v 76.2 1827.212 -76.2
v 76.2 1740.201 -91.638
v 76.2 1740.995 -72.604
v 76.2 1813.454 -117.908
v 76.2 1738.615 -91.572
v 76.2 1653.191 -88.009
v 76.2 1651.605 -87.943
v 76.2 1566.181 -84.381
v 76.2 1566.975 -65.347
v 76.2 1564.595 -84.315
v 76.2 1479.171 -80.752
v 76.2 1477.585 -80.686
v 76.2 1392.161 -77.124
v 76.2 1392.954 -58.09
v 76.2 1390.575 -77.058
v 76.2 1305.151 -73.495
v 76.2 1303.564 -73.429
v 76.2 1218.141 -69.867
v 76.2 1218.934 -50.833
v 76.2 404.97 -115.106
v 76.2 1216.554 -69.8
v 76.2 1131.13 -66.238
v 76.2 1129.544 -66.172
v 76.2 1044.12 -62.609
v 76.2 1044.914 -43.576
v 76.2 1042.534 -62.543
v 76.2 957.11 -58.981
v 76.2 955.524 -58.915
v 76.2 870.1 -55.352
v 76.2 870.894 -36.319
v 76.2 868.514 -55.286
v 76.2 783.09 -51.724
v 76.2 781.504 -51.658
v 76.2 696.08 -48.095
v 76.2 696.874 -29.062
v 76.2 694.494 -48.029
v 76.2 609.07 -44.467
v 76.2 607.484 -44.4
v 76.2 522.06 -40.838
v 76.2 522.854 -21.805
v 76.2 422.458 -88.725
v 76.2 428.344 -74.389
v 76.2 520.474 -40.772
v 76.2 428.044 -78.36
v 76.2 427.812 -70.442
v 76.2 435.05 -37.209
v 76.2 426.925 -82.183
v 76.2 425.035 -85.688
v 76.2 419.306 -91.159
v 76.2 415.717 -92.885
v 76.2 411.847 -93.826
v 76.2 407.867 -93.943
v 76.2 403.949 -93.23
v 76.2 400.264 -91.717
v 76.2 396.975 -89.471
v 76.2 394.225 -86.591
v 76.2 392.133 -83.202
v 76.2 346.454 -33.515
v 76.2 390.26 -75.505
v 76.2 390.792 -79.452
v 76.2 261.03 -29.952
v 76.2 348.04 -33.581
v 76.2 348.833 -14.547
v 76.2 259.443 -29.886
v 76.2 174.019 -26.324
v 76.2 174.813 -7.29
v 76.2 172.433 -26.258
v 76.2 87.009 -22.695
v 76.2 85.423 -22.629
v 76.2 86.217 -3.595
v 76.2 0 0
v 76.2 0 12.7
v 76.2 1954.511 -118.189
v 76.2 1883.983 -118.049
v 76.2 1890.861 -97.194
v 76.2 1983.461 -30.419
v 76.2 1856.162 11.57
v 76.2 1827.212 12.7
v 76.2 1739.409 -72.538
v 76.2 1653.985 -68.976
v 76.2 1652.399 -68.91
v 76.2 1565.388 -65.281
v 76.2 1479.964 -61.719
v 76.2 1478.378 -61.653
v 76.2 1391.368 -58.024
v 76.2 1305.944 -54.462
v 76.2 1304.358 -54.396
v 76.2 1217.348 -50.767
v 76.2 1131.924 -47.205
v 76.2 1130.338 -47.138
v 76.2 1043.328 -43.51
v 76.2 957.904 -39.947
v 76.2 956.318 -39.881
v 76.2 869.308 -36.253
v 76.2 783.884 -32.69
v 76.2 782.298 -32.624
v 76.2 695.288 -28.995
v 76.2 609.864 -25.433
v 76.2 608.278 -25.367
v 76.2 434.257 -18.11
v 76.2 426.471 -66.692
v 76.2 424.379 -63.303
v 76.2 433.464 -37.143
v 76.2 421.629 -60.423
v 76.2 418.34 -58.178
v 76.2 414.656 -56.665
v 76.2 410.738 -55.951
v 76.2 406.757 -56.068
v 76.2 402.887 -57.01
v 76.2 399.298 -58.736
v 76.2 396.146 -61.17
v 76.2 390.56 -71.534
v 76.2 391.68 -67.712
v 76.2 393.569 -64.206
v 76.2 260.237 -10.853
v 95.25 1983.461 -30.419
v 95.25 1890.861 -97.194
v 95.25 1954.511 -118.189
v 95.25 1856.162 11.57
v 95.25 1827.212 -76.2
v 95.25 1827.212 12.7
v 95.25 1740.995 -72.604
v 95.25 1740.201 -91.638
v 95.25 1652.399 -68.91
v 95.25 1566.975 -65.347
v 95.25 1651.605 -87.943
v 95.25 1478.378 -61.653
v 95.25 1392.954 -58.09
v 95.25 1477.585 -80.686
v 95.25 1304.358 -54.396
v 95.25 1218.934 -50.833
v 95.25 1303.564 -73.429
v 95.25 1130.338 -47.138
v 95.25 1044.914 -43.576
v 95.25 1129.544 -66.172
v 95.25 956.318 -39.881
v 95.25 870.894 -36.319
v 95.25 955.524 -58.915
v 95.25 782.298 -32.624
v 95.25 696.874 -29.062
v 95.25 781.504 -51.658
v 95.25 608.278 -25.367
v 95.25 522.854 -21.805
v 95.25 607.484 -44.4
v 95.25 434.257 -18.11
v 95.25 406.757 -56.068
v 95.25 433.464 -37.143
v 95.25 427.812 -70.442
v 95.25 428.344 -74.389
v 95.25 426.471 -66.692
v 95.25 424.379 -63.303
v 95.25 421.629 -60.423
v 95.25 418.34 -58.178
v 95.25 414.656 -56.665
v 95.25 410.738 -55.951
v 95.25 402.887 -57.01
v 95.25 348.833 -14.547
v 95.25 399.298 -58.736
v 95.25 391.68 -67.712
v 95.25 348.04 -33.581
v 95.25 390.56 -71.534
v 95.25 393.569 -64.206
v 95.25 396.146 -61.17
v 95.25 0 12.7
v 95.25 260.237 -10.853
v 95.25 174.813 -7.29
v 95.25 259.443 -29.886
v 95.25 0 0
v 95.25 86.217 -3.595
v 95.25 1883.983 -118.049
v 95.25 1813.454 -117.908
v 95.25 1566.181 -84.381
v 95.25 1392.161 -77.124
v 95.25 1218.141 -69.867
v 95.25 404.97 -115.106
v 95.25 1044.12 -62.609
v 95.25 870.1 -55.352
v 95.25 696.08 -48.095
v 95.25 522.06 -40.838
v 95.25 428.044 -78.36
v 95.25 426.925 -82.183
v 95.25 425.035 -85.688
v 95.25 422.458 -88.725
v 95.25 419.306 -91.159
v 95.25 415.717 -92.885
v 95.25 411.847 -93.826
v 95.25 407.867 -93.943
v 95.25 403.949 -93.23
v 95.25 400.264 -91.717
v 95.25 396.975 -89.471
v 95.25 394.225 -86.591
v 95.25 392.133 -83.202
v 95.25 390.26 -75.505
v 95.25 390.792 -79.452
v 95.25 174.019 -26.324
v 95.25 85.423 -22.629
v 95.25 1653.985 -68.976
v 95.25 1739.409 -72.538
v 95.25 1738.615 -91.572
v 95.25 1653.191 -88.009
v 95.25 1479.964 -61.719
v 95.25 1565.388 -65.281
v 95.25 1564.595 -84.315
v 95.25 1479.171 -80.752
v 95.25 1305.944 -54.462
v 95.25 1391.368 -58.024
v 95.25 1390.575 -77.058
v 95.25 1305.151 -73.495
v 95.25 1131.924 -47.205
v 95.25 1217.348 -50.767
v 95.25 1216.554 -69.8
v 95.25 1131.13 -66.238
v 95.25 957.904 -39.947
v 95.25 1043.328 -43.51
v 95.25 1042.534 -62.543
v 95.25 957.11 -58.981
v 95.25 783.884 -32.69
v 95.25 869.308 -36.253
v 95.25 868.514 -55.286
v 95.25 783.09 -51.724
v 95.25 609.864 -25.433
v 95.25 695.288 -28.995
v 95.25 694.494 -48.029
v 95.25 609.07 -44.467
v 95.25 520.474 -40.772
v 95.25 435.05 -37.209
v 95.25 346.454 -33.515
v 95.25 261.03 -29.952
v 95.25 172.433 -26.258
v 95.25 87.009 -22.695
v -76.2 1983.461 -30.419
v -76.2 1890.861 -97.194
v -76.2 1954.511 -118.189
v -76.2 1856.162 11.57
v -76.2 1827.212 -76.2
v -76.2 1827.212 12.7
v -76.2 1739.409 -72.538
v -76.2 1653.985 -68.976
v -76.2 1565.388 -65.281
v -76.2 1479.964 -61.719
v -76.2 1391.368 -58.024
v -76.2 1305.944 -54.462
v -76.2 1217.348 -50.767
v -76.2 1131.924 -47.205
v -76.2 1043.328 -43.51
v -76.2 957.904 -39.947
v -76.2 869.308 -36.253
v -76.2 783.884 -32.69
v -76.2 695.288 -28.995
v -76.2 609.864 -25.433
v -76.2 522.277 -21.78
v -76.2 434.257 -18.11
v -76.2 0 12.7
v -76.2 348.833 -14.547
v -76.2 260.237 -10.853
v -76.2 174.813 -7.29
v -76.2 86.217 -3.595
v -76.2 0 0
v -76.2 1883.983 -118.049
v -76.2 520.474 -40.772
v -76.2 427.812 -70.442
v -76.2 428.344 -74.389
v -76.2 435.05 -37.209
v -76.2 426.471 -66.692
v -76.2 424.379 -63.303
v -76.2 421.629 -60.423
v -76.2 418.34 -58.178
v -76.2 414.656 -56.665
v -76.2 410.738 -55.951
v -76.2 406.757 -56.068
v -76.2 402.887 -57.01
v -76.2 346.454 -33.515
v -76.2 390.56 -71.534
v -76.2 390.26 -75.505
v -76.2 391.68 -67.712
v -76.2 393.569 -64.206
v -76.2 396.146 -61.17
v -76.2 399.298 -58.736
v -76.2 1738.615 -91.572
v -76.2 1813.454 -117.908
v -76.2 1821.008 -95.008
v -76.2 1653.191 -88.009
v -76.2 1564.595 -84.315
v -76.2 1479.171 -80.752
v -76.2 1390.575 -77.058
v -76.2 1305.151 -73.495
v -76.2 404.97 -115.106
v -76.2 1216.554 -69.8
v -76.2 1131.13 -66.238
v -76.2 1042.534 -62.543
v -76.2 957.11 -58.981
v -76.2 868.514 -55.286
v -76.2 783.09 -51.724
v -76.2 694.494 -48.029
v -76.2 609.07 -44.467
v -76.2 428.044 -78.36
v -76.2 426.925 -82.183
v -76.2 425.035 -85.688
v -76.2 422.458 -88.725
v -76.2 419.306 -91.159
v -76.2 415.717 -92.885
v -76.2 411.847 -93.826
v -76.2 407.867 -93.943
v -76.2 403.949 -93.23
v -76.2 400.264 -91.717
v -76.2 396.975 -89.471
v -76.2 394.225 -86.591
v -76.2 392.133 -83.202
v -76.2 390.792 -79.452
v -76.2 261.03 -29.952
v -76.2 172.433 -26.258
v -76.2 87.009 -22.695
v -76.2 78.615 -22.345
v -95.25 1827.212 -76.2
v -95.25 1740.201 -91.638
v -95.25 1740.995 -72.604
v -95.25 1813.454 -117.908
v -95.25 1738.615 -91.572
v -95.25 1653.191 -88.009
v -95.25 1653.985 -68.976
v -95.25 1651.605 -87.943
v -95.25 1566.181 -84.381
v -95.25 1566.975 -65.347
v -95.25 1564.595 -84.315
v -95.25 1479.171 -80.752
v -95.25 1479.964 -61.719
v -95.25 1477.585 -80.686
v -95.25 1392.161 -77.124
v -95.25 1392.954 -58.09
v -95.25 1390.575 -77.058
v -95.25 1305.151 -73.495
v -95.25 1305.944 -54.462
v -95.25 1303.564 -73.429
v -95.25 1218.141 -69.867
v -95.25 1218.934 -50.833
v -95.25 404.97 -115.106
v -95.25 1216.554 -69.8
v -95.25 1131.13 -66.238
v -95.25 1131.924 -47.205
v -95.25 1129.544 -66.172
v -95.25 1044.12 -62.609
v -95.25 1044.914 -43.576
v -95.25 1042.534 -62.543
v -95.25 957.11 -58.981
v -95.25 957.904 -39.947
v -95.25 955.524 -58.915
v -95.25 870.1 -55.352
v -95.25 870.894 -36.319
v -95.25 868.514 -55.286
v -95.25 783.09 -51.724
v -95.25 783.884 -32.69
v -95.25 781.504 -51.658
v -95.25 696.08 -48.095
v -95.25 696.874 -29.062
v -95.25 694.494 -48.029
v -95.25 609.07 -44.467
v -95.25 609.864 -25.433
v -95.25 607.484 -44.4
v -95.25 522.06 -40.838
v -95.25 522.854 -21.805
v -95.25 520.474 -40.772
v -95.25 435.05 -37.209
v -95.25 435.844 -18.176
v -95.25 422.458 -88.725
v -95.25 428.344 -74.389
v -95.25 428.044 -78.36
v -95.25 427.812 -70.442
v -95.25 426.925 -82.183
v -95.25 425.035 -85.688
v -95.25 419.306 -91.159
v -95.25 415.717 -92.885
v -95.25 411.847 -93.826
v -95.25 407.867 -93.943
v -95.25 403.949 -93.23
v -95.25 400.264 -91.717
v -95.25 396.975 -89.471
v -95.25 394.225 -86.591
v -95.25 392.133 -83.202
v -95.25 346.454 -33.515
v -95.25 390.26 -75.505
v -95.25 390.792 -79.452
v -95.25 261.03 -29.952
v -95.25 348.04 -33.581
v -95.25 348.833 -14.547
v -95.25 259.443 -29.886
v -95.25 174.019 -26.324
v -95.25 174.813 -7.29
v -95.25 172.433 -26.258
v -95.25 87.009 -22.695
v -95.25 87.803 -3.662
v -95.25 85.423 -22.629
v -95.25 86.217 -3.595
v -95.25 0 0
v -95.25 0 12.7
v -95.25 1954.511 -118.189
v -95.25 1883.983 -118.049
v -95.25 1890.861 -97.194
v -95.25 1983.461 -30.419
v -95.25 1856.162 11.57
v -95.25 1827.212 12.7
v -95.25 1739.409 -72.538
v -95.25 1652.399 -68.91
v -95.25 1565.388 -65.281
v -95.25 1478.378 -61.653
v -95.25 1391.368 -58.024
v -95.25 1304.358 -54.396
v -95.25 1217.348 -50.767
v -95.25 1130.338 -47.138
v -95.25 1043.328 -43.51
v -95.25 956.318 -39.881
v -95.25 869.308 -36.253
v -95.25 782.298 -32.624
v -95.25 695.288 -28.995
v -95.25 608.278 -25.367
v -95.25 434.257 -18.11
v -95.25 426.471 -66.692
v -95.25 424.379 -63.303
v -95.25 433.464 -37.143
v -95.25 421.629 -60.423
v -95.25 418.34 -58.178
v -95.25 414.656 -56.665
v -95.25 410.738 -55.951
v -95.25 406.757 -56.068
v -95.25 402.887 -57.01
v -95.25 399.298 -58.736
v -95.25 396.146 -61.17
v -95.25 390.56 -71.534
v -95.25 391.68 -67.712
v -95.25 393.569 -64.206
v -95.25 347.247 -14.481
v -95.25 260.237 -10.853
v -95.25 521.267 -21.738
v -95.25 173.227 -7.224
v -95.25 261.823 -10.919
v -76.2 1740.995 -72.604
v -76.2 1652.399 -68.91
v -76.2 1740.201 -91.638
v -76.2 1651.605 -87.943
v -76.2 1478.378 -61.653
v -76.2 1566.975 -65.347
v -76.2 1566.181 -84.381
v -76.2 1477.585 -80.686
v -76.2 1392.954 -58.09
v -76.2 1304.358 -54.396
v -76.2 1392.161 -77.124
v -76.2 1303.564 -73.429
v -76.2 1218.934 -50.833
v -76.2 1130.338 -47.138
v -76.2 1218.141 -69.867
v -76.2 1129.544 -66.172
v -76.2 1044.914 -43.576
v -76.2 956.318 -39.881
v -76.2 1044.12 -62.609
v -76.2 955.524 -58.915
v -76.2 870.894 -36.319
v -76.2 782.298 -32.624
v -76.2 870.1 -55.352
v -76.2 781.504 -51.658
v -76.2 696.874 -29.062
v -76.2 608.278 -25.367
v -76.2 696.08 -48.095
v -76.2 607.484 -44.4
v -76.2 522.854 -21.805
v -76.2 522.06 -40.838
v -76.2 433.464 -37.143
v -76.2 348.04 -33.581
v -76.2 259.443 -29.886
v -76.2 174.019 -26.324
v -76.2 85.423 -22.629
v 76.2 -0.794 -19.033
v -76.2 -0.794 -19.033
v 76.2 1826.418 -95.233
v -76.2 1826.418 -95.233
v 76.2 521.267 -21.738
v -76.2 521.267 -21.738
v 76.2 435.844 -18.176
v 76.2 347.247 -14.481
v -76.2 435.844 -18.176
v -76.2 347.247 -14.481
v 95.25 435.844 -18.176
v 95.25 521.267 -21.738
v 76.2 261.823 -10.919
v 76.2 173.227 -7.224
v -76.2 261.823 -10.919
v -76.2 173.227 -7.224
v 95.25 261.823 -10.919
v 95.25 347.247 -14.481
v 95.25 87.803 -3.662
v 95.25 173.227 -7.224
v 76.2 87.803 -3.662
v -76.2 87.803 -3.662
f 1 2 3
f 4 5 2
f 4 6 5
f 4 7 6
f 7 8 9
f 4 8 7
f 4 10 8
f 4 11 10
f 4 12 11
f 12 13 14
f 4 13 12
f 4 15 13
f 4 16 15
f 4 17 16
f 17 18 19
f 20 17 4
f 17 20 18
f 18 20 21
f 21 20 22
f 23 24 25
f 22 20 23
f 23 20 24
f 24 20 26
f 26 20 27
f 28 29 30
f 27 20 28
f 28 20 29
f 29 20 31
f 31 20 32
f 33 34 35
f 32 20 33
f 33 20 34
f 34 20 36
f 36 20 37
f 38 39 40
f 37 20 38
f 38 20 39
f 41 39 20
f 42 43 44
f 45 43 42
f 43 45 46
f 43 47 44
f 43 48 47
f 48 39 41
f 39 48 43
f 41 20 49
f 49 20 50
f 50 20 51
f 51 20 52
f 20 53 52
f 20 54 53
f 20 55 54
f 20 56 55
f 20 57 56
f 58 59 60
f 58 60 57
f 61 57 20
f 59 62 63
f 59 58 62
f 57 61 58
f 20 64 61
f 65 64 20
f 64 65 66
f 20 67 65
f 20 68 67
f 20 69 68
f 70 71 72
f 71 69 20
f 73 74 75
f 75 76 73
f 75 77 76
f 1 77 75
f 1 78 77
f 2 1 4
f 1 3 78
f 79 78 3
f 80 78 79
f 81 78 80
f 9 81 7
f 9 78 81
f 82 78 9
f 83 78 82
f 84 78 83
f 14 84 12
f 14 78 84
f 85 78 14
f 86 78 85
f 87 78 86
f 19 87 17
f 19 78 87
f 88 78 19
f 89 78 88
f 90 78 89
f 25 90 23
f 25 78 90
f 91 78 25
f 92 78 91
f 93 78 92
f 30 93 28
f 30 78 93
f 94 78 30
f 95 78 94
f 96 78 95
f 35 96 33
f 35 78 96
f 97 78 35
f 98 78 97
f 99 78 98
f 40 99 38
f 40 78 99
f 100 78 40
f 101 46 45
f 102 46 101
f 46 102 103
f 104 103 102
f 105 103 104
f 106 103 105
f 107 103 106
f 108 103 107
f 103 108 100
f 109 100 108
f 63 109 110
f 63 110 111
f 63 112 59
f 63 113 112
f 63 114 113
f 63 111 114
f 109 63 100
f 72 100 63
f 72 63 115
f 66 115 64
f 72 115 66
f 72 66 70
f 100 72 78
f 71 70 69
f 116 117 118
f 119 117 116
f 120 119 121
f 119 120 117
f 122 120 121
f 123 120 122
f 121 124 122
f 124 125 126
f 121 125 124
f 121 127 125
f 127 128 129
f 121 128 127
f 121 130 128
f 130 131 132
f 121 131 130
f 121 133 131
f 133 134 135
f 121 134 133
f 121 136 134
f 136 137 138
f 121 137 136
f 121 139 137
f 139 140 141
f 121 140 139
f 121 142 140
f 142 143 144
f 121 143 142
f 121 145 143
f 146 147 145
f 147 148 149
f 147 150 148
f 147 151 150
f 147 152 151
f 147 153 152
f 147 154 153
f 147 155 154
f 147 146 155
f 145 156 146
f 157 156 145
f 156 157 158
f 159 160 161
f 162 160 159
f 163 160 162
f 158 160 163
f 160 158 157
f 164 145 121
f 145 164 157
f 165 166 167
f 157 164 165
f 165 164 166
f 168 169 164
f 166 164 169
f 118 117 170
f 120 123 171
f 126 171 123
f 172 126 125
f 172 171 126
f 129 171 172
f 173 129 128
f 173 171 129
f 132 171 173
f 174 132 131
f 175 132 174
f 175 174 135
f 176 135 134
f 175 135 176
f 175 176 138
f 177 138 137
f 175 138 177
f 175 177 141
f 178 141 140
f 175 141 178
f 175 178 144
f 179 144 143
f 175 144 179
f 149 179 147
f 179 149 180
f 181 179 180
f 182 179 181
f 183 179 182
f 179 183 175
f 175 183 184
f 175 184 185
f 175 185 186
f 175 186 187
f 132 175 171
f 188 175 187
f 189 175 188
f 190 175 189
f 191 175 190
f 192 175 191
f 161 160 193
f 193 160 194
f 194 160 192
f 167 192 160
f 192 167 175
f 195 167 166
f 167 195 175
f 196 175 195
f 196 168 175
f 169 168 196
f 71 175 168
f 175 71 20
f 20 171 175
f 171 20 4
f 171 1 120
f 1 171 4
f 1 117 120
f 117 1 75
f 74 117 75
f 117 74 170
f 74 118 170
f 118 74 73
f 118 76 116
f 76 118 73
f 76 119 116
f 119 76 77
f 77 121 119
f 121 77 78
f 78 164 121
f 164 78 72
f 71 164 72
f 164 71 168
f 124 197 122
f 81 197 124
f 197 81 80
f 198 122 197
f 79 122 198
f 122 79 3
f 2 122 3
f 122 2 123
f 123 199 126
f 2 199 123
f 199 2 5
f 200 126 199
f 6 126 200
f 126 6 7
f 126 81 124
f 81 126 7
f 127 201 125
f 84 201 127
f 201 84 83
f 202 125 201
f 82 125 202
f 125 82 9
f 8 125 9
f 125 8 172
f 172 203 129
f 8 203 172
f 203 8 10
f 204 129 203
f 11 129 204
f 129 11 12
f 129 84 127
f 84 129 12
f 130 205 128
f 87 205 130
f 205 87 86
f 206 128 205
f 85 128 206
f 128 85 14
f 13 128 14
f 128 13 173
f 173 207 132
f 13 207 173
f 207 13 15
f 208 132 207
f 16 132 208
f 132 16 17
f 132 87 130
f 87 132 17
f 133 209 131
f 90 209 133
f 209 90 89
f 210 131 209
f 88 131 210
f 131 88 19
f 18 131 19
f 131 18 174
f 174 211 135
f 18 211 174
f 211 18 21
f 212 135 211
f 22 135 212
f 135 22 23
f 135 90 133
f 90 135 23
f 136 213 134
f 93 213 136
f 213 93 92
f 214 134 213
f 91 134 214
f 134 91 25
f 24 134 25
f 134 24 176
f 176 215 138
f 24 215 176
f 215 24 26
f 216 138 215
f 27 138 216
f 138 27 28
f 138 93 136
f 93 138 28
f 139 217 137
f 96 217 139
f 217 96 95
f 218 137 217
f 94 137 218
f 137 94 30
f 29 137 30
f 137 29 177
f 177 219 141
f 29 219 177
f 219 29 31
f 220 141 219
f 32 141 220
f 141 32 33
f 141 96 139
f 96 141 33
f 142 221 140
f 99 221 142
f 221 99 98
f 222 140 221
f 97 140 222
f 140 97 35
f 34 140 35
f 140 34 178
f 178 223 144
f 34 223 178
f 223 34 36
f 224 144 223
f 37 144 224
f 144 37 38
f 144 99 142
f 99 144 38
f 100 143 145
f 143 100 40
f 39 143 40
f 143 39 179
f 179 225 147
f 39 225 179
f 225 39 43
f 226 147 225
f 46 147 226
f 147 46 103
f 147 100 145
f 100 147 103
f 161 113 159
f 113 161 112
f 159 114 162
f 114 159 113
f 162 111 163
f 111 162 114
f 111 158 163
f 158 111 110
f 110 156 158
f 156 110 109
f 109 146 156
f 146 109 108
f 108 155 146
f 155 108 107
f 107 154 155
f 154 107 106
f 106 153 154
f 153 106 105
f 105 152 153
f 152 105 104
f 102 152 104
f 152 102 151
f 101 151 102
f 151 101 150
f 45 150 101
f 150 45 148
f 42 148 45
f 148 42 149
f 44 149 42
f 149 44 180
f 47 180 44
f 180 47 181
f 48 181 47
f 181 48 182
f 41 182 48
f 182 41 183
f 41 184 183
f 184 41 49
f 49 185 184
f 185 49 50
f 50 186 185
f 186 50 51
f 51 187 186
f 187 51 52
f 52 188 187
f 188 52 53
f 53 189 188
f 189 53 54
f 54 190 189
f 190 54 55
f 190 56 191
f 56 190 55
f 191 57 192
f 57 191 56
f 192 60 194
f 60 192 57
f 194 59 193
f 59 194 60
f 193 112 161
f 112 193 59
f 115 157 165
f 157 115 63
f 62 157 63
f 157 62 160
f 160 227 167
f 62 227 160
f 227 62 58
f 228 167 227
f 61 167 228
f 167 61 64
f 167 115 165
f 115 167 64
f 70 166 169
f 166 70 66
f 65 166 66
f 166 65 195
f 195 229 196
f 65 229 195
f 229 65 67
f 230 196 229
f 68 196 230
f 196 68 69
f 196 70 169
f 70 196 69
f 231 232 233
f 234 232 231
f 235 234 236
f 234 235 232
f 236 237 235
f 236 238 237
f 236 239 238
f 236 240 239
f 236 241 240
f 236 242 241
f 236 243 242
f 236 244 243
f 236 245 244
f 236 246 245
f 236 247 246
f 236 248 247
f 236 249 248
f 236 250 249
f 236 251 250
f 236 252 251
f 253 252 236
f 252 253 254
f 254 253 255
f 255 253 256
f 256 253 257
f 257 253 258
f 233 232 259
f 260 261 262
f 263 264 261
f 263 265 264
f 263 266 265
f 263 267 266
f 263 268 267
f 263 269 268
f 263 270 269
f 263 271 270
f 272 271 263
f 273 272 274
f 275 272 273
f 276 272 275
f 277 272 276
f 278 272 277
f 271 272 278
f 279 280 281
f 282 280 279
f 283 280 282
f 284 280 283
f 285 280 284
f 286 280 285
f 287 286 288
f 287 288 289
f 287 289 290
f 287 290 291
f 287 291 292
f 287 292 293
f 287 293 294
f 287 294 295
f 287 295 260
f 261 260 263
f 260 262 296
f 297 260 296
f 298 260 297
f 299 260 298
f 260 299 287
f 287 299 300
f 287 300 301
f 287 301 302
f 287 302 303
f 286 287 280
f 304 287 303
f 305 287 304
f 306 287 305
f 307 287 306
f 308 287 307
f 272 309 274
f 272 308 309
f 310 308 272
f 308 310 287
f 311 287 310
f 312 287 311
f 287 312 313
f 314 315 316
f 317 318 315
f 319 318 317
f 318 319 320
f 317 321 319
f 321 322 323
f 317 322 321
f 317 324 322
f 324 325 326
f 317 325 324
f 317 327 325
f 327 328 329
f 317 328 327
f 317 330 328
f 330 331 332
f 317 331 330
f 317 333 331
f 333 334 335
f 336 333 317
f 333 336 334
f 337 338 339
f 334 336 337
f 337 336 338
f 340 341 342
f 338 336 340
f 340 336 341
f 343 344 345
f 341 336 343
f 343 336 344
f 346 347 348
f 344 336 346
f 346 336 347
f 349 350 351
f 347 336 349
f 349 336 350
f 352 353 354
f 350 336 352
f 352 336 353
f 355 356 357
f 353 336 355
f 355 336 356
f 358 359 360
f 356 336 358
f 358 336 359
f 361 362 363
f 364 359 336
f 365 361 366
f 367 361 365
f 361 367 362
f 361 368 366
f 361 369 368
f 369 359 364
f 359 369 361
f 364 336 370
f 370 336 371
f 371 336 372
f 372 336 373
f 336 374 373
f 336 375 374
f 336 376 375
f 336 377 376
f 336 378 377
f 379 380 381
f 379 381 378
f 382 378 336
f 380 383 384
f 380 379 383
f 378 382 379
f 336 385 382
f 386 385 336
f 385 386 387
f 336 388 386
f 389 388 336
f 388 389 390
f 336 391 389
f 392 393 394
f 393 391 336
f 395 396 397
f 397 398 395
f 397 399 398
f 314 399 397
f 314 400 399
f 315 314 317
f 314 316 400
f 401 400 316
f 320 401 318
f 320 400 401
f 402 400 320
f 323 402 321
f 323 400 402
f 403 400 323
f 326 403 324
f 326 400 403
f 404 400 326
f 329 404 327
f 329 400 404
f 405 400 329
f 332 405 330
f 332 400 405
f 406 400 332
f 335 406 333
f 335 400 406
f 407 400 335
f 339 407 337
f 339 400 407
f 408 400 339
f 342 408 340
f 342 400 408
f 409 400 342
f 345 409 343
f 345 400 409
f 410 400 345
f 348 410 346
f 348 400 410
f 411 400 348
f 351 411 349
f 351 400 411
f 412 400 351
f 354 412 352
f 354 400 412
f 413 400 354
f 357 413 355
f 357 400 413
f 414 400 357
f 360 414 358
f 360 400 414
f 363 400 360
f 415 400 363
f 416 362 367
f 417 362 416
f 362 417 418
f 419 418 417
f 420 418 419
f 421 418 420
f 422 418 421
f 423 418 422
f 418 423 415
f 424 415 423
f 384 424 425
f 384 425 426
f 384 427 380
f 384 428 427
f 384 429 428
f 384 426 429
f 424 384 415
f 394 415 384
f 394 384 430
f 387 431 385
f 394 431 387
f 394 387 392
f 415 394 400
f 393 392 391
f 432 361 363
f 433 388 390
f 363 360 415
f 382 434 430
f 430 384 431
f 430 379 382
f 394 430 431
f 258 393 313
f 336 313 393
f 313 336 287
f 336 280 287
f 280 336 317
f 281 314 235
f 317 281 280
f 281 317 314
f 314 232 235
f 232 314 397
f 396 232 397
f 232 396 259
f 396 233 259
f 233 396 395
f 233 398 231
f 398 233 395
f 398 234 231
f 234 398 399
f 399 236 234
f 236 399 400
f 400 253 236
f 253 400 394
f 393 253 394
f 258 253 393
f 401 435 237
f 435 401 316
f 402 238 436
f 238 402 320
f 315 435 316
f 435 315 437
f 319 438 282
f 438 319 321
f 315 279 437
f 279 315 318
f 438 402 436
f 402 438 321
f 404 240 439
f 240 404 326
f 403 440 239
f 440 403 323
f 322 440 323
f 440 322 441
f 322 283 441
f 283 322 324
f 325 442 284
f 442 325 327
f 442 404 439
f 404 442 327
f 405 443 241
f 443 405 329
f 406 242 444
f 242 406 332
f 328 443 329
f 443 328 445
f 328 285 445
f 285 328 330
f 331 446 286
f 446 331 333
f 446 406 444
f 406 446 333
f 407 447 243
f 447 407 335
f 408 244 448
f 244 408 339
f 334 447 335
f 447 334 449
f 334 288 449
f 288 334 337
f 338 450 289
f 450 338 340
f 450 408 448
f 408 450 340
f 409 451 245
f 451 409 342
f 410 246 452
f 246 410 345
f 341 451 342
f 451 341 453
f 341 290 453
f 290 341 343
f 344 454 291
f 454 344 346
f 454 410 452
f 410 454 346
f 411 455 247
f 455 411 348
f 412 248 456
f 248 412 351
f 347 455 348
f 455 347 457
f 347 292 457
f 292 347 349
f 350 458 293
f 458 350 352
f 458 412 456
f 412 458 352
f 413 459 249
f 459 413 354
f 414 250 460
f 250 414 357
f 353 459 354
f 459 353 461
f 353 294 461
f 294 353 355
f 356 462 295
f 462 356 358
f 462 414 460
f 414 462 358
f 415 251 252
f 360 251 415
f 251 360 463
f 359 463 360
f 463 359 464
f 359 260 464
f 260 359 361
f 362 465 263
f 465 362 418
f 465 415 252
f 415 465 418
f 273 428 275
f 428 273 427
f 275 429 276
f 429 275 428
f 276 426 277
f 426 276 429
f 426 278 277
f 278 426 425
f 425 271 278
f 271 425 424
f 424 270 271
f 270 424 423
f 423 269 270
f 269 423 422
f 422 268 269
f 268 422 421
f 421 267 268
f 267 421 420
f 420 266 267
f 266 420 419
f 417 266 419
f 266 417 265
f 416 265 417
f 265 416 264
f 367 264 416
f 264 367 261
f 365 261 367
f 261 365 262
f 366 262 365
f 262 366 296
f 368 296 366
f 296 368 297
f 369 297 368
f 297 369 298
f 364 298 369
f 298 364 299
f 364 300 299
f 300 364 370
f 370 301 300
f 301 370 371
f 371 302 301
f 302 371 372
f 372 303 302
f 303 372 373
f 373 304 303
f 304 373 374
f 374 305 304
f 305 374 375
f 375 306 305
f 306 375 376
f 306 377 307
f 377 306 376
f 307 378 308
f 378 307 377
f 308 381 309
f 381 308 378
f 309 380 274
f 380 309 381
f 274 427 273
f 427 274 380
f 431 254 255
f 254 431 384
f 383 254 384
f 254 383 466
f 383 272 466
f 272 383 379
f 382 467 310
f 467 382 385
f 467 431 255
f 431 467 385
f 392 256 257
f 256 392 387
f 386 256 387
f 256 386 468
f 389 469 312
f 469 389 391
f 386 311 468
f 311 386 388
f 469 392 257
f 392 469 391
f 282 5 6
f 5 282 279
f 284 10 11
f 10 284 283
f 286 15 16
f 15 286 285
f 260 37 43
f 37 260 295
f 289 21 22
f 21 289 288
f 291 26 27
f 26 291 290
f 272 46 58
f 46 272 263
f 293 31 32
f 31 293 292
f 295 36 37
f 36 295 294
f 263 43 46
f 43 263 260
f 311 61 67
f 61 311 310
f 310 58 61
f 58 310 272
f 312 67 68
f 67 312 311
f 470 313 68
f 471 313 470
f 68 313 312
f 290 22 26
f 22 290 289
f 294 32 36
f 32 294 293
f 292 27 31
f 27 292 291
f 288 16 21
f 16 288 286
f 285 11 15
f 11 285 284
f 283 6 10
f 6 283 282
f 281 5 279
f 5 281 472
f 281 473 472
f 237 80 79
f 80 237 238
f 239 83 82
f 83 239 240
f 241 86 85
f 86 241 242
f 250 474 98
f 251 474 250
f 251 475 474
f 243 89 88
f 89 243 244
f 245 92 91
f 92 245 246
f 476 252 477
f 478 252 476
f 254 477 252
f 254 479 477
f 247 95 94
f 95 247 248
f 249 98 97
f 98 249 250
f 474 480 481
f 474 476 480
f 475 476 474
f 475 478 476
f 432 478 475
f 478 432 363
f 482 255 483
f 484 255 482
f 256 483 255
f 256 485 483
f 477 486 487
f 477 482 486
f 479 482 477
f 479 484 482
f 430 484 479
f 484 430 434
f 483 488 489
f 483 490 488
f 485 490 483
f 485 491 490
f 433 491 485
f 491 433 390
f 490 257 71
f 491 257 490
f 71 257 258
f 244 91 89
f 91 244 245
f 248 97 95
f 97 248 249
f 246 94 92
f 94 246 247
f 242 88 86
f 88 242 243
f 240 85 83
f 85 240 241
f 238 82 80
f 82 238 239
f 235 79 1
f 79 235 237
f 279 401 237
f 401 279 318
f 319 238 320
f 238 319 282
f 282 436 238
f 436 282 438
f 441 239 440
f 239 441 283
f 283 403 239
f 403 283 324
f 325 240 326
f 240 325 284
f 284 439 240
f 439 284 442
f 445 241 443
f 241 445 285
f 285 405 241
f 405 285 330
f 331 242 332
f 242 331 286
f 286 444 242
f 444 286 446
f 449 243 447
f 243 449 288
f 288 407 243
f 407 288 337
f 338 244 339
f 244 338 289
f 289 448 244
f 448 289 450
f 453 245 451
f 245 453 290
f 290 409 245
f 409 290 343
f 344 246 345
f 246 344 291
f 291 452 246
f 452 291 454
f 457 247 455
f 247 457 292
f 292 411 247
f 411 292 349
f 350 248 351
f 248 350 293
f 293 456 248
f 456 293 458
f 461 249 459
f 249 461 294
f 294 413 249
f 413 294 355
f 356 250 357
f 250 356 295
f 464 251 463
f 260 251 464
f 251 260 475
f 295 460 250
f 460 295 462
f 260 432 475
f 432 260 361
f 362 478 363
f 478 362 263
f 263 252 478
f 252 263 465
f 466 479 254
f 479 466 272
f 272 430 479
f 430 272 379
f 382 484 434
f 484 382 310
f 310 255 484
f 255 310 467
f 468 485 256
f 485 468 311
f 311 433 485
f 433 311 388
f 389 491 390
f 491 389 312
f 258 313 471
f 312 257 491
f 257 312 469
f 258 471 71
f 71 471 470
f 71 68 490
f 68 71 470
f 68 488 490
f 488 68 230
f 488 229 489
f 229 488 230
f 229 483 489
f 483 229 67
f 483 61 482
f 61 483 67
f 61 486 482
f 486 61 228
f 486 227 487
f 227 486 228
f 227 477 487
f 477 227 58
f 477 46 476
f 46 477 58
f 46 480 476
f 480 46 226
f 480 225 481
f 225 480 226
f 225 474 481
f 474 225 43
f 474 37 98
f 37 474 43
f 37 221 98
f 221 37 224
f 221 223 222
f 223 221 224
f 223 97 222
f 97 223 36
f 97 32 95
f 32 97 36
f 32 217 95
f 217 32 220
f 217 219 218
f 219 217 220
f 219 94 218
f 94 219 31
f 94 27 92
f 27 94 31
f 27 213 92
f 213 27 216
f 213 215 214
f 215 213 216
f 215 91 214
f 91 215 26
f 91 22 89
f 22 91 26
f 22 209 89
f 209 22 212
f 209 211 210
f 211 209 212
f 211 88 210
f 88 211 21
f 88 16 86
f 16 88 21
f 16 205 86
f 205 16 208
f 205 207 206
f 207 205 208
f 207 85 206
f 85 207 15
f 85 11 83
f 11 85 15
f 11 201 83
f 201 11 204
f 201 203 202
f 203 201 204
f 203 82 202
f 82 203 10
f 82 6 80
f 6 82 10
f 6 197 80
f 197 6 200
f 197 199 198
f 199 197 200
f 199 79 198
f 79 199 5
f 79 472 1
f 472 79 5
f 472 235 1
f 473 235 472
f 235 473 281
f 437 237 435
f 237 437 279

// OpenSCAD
// file: joints.scad
module pintail_gaps(edge,depth,pins,gap=0) {
    segments=pins*2+1;
    segment=edge/segments;

    for(y=[segment:segment:edge-1])
    translate([0,y-gap/2])
    square([depth,gap]);
}

module negative_pins(edge,depth,pins,gap=0,hole=0) {
    segments=pins*2+1;
    segment=edge/segments;

    for(y=[0:segment*2:edge])
    translate([0,y])
    square([depth,segment]);

    pintail_gaps(edge,depth,pins,gap);

    if(hole)
    pin_holes(edge,depth,pins,hole);

}

module pintail_test(edge=200,depth=12,pins=4,gap=3,hole=6) {
    color("lime")
    negative_pins(edge,depth,pins,gap,hole);
    color("blue")
    negative_tails(edge,depth,pins,gap,hole);
}

module tail_holes(edge,depth,pins,hole) {
    segments=pins*2+1;
    segment=edge/segments;

    for(y=[segment/2:segment*2:edge])
    translate([depth/2,y])
    circle(d=hole);
}


module pin_holes(edge,depth,pins,hole) {
    segments=pins*2+1;
    segment=edge/segments;

    for(y=[segment*1.5:segment*2:edge])
    translate([depth/2,y])
    circle(d=hole);
}

module negative_tails(edge,depth,pins,gap=0,hole=0) {
    segments=pins*2+1;
    segment=edge/segments;

    for(y=[segment:segment*2:edge-1])
    translate([0,y])
    square([depth,segment]);
    pintail_gaps(edge,depth,pins,gap);

    if(hole)
    tail_holes(edge,depth,pins,hole);
}

pintail_test();
// main file
in=25.4;
ft=12*in;

use <joints.scad>;

width=6*in;
length=6*ft;

gate=500;

ramp_angle=asin(gate/length);

base_wood=0.75*in;
side_wood=base_wood;



module dirror_x(x=0) {
    children();
    translate([x,0])
    mirror([1,0])
    children();
    
}

hole=1.5*in;


bottom_extra=1.5*in;
top_extra=0.5*in;
side=5*in;


side_angle=asin((side-bottom_extra-top_extra)/length);
side_length=cos(side_angle)*length;

//display_angle=0;
//display_angle=ramp_angle;
display_angle=-side_angle;

flat=bottom_extra/tan(ramp_angle);


// this isn't right but it's close enough
thickest=(side-bottom_extra)/cos(ramp_angle);

ground_wall=0*in;
top_wall=0*in;

joint=length-top_wall-ground_wall;

module base_positive() {
    translate([side_wood,0])
    square([width,length]);
    translate([0,ground_wall])
    square([width+side_wood*2,joint]);
}


pins=10;
pintail_gap=in/16;
bit=in/4;
pintail_ear=bit;

hole_x=side/2-10;
hole_y=310;


module base() {
    difference() {
        base_positive();
        dirror_x(width+side_wood*2)
        translate([0,ground_wall])
        negative_pins(joint,side_wood,pins,pintail_gap,0,pintail_ear);
    }
}

module assembled() {
    color("lime")
    rotate([display_angle,0])
    translate([0,0,-base_wood])
    linear_extrude(height=base_wood)
    translate([-width/2-side_wood,0])
    base();

    rotate([display_angle,0])
    dirror_x()
    translate([width/2,0])
    rotate([0,90])
    linear_extrude(height=side_wood)
    side();
}

assembled();

//side();

tooth=5*in;

thin=(side-bottom_extra)/cos(ramp_angle);
module side() {
    difference() {
        hull() {
            rotate([0,0,side_angle])
            translate([-top_extra,0])
            square([side,side_length]);


            translate([0,length])
            rotate([0,0,-ramp_angle])
            translate([-thin,0])
            square([thin,flat]);
            
        }

        x=side*2;

        // gate
        translate([0,length])
        rotate([0,0,-ramp_angle])
        difference() {
            square([x,side_length]);
            translate([0,flat/2])
            square([x,tooth]);
        }

        // ground slice
        rotate([0,0,side_angle-ramp_angle])
        square([x,side_length]);

        translate([0,ground_wall])
        negative_tails(joint,side_wood,pins,pintail_gap,0,pintail_ear);

        pivot=(side-top_extra)/sin(ramp_angle);
        rotate([0,0,side_angle-ramp_angle])
        translate([0,pivot])
        rotate([0,0,90+ramp_angle/2-side_angle])
        translate([0,40])
        circle(d=hole);
    }
}


module bleh_side() {

    cut=cos(ramp_angle)*below;
    flat=cut/sin(ramp_angle);

    //flat=5*in;

    extra=cos(ramp_angle)*flat;


    above=1.5*in;
    below=2*in;
    side=above+base_wood+below;

    dirror_x()
    translate([-width/2,0])
    rotate([display_angle,0])
    rotate([0,-90])
    translate([-below-base_wood,0])
    linear_extrude(height=side_wood)
    side();

    module side() {
        difference() {
            square([side,length+extra]);
            translate([below+base_wood,0])
            rotate([0,0,ramp_angle])
            translate([-side,0])
            square([side,length]);

            translate([below,length])
            rotate([0,0,ramp_angle])
            translate([-side,0])
            square([side,length]);
        }
    }
}

module triangle() {
    lip=3*in;
    spine_angle=45;
    spine=tan(spine_angle)/(width/2);
    side_below=(width/2)/cos(spine_angle);
    side=side_below+lip;


    dirror_x()
    translate([width/2,0])
    rotate([ramp_angle,0,0])
    rotate([0,-spine_angle,0])
    translate([-side_below,0])
    linear_extrude(height=base_wood)
    square([side,length]);
}
